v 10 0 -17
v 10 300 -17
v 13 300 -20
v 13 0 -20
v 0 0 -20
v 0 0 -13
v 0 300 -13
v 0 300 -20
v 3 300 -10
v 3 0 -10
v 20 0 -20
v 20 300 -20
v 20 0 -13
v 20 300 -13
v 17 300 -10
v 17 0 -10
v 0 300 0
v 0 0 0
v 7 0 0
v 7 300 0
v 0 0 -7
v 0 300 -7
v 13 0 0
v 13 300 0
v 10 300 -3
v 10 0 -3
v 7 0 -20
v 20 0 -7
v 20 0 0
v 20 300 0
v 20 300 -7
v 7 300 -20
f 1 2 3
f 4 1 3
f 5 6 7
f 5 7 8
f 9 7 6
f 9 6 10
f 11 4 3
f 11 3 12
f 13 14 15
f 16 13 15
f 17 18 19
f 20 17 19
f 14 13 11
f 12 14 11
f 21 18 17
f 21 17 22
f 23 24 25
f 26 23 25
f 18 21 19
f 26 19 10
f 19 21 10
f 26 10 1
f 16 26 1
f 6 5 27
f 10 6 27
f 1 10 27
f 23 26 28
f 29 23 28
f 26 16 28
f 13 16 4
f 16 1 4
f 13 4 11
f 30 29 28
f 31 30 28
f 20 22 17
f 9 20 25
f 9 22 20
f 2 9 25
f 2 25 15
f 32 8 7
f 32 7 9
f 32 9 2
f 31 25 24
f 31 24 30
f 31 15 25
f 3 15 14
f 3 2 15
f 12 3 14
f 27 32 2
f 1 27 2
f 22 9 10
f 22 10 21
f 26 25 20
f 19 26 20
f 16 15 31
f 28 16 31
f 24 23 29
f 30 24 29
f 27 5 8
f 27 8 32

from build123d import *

# Parameters (mm, degrees)
SKIZZE1_W                       = 20
SKIZZE1_H                       = 20
AUFSATZ_LINEAR_AUSTRAGEN1_DEPTH = 300
SCHNITT_LINEAR_AUSTRAGEN1_DEPTH = 302.330383466


with BuildPart() as part:
    # Skizze1 → Aufsatz-Linear austragen1 (new body)
    with BuildSketch(Plane(origin=(0, 0, 0), x_dir=(1, 0, 0), z_dir=(0, 1, 0))):
        with Locations((10, 10)):
            Rectangle(SKIZZE1_W, SKIZZE1_H)
    extrude(amount=AUFSATZ_LINEAR_AUSTRAGEN1_DEPTH)

    # Skizze2 → Schnitt-Linear austragen1 (cut, through all)
    with BuildSketch(Plane(origin=(0, 300, 0), x_dir=(1, 0, 0), z_dir=(0, 1, 0))):
        Polygon((7, 20), (10, 17), (13, 20), align=None)
        Polygon((20, 13), (17, 10), (20, 7), align=None)
        Polygon((0, 7), (0, 13), (3, 10), align=None)
        Polygon((7, 0), (13, 0), (10, 3), align=None)
    extrude(amount=-SCHNITT_LINEAR_AUSTRAGEN1_DEPTH, mode=Mode.SUBTRACT)


solid = part.part
